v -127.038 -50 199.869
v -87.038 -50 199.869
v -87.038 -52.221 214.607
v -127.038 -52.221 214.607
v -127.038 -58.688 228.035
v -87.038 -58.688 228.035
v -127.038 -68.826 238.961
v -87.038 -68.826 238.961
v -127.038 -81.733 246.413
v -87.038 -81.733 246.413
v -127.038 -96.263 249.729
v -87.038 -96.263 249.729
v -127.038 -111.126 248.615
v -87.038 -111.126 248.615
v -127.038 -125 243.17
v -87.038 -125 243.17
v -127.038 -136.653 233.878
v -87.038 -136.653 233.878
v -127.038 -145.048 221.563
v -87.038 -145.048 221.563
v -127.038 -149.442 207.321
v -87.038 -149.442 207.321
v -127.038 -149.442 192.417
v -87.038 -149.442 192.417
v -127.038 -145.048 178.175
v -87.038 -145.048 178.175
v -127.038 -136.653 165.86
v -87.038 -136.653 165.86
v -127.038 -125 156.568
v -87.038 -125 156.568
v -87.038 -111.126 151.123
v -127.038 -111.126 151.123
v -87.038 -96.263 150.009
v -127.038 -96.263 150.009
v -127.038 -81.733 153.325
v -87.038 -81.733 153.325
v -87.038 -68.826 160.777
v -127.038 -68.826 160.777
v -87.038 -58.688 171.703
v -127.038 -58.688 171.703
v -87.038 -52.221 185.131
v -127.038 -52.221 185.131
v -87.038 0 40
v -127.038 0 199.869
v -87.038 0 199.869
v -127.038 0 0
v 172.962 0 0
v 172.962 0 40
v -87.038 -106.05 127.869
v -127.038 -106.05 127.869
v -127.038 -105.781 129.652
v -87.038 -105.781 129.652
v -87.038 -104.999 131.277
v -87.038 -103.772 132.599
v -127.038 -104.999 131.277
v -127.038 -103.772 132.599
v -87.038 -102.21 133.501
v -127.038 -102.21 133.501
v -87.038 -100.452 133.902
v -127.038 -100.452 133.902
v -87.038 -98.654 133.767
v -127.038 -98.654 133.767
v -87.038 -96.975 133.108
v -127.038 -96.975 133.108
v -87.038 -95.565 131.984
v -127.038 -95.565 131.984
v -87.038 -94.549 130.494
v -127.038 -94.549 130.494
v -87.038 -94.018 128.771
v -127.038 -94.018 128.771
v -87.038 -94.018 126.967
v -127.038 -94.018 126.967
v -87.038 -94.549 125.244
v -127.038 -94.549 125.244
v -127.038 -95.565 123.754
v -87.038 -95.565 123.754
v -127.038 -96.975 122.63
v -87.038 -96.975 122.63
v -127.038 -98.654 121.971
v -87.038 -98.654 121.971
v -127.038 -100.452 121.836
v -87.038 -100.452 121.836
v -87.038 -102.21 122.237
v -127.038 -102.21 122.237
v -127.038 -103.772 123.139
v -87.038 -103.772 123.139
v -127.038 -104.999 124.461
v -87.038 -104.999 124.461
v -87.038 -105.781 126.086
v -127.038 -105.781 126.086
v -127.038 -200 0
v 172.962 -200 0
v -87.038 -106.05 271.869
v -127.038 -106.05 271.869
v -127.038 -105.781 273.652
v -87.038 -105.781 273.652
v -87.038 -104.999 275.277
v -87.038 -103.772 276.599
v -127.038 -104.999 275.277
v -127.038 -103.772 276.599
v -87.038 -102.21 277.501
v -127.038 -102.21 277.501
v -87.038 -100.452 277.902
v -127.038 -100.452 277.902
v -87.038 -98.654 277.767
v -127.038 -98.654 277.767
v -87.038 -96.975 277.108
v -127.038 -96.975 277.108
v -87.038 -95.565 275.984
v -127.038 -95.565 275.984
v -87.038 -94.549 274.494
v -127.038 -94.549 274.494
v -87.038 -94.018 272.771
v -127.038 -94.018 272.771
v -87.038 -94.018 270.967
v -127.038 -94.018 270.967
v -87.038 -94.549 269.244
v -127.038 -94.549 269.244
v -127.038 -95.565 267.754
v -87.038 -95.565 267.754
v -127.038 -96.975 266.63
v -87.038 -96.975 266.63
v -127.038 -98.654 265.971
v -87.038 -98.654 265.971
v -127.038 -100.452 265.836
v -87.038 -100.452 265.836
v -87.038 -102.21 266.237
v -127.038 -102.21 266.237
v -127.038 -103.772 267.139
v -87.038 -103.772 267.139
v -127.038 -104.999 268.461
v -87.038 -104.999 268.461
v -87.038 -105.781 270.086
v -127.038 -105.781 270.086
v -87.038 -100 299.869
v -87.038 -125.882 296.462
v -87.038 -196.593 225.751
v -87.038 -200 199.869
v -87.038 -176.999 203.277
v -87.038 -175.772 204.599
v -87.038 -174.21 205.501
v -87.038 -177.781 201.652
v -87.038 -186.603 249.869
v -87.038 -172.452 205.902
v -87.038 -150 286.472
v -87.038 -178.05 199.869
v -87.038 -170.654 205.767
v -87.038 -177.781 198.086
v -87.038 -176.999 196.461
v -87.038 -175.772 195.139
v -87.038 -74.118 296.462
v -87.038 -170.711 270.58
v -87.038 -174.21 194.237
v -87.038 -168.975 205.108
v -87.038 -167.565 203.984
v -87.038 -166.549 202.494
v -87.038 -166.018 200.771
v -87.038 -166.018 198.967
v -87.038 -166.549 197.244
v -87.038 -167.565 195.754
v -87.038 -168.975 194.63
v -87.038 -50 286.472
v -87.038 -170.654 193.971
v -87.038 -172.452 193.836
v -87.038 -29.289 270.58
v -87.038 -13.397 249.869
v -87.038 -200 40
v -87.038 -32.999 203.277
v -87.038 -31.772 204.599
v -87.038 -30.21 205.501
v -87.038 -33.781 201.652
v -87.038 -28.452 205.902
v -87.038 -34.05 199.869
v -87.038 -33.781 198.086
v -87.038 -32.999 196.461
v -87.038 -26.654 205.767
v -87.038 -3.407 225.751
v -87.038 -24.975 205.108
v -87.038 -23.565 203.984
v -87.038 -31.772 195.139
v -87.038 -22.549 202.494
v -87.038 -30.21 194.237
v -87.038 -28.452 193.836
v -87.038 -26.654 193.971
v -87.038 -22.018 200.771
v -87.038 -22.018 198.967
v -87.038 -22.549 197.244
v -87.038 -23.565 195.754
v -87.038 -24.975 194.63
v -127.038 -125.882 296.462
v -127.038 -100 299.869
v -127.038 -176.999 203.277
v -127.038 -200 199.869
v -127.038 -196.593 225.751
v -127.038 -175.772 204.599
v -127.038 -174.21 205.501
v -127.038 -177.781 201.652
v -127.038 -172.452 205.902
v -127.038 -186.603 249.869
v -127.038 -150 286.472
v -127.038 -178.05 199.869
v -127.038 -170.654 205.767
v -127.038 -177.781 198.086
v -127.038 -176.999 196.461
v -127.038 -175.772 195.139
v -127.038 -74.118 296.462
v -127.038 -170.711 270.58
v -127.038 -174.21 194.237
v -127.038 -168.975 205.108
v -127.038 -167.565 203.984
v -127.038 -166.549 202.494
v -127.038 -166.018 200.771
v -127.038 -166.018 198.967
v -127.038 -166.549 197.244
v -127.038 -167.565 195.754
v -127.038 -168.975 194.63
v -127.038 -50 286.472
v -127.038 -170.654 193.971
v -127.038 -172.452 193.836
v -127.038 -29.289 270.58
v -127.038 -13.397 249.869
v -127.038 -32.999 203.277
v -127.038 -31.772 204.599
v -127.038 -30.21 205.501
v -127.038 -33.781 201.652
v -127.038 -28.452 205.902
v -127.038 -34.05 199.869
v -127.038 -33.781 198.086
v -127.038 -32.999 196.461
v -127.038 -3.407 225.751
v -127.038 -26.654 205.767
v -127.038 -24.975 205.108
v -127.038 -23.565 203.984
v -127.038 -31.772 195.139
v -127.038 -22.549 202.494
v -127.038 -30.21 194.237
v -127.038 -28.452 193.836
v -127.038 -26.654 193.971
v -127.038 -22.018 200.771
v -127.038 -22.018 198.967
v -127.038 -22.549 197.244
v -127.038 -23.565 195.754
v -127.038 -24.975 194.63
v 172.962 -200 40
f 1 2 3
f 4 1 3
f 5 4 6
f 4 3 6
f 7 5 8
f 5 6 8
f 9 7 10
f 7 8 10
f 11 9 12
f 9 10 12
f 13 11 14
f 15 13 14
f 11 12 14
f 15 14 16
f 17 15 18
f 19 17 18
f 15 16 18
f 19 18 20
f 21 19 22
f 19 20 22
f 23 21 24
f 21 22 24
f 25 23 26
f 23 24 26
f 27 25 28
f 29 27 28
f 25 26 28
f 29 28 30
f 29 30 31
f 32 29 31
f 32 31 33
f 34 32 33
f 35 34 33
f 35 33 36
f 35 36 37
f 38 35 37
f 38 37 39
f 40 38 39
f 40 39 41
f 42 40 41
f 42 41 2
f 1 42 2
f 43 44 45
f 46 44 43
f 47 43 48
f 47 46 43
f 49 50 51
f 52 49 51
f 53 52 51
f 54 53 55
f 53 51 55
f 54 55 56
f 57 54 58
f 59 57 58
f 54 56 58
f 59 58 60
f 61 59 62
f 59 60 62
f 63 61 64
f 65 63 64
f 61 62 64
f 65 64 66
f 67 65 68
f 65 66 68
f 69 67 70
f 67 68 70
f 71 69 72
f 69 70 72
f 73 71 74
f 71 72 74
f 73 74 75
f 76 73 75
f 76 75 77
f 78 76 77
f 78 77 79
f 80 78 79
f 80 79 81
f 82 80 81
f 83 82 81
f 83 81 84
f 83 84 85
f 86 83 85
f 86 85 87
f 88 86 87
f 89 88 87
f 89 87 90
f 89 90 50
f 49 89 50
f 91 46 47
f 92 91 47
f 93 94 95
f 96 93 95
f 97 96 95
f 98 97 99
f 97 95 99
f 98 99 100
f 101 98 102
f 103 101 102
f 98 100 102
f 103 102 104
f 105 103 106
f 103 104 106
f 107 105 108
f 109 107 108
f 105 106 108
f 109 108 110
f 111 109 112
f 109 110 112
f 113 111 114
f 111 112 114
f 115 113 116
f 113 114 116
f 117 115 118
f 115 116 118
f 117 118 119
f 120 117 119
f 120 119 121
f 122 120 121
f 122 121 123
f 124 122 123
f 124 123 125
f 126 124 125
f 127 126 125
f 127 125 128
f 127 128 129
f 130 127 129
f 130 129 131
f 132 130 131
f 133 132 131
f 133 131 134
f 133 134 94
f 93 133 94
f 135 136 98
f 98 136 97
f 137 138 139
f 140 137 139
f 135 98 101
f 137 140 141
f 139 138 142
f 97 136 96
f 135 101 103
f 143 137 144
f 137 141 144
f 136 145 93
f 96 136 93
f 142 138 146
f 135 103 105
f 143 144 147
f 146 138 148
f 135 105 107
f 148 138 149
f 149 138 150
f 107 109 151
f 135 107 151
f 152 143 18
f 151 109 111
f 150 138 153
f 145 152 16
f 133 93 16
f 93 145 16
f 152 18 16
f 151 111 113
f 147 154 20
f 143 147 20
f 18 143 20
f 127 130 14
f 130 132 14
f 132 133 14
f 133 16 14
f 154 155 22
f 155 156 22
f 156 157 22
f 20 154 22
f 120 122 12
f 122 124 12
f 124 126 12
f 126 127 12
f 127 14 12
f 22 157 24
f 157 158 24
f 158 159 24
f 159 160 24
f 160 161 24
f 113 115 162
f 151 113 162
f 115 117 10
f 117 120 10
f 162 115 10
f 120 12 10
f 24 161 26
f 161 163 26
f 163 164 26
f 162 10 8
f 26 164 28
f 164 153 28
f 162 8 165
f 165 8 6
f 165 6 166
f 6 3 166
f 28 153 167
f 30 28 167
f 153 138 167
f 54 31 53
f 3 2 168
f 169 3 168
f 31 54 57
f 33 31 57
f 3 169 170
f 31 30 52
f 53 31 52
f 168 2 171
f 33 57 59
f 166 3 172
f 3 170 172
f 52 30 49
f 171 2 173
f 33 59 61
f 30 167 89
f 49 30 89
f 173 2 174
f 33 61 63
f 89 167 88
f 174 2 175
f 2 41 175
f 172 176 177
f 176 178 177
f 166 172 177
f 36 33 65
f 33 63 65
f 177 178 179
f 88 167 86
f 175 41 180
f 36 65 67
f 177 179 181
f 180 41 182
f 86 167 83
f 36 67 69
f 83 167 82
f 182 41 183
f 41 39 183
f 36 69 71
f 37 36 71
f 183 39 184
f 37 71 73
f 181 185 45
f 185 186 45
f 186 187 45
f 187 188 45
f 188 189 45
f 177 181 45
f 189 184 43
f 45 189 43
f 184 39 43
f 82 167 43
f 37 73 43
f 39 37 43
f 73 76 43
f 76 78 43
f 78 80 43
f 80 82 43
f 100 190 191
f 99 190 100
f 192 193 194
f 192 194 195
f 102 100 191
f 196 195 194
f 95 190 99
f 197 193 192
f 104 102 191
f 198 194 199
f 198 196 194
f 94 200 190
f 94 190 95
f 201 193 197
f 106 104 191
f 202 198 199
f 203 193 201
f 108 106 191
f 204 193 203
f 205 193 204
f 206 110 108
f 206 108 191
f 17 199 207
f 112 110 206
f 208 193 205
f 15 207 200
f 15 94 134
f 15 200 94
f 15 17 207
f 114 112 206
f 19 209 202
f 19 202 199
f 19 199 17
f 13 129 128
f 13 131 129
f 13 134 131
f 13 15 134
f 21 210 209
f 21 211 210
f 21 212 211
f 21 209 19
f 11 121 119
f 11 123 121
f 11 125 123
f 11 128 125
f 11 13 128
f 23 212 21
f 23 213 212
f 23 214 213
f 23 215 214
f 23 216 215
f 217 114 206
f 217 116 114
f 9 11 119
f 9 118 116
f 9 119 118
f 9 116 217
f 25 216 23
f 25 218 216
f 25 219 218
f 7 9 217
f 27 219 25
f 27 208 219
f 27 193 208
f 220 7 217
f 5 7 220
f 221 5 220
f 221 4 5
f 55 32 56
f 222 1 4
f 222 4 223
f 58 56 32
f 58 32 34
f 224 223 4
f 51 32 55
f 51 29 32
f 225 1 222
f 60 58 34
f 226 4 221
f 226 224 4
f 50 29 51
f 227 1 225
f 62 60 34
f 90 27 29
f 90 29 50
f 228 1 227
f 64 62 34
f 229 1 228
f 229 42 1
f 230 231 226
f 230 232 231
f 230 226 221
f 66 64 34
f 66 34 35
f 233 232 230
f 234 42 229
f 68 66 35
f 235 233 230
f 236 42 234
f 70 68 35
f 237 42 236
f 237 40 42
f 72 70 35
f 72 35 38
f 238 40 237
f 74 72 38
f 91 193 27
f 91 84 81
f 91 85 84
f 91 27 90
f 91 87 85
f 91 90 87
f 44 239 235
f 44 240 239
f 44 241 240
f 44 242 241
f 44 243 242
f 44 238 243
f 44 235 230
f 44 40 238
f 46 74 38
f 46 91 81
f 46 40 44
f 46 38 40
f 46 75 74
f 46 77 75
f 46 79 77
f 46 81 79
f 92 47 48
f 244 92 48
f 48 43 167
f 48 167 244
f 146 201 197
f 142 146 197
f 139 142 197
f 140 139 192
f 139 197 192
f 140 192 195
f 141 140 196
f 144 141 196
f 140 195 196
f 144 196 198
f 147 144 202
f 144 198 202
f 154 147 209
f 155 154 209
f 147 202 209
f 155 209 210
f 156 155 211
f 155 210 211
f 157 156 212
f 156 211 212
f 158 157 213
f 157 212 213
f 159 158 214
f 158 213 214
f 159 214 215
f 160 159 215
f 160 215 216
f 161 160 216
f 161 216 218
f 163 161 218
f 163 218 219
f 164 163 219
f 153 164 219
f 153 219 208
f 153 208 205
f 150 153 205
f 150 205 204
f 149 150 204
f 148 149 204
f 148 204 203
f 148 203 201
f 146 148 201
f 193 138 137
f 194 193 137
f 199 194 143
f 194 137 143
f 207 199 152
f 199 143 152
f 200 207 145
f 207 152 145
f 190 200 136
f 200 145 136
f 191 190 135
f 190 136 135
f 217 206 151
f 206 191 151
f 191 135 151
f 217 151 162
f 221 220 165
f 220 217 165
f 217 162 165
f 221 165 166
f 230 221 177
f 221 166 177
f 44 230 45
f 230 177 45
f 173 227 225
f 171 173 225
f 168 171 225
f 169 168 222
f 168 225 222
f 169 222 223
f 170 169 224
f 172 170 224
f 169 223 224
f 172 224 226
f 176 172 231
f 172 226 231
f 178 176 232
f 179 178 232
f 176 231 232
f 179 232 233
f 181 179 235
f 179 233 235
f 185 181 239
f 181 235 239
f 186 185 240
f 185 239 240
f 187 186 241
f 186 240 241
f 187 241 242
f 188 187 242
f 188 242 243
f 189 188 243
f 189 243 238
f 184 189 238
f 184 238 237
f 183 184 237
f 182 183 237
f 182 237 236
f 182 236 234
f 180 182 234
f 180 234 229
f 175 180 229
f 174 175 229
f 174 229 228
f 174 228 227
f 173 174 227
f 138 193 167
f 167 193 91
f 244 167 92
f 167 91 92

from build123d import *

# Parameters (mm, degrees)
F0_W     = 300
F0_H     = 40
F1_DEPTH = 200
F2_W     = 40
F2_H     = 200
F3_DEPTH = 260
F5_DEPTH = 40.001
F6_R     = 50
F7_DEPTH = 40.001
F8_D     = 12.1


with BuildPart() as f1:
    # F0 (on Front) → F1 (new body)
    with BuildSketch(Plane.XZ):
        with Locations((22.9622232423, 20)):
            Rectangle(F0_W, F0_H)
    extrude(amount=F1_DEPTH)

    # F2 (on face) → F3 (join)
    with BuildSketch(Plane.XY.offset(40)):
        with Locations((-107.0377767577, -100)):
            Rectangle(F2_W, F2_H)
    extrude(amount=F3_DEPTH)

    # F4 (on face) → F5 (cut, through all)
    with BuildSketch(Plane.YZ.offset(-87.0377767577)):
        with BuildLine():
            ThreePointArc((-200, 199.8689621687), (-100, 299.8689621687), (0, 199.8689621687))
            Line((0, 199.8689621687), (0, 300))
            Line((0, 300), (-200, 300))
            Line((-200, 300), (-200, 199.8689621687))
        make_face()
    extrude(amount=-F5_DEPTH, mode=Mode.SUBTRACT)

    # F6 (on face) → F7 (cut, through all)
    with BuildSketch(Plane.YZ.offset(-87.0377767577)):
        with Locations((-100, 199.8689621687)):
            Circle(F6_R)
    extrude(amount=-F7_DEPTH, mode=Mode.SUBTRACT)

    # F8 (through all)
    with Locations(Plane.YZ.offset(-87.0377767577)):
        with Locations((-100, 271.8689621687), (-172, 199.8689621687), (-100, 127.8689621687), (-28, 199.8689621687)):
            Hole(F8_D / 2)


solid = f1.part
